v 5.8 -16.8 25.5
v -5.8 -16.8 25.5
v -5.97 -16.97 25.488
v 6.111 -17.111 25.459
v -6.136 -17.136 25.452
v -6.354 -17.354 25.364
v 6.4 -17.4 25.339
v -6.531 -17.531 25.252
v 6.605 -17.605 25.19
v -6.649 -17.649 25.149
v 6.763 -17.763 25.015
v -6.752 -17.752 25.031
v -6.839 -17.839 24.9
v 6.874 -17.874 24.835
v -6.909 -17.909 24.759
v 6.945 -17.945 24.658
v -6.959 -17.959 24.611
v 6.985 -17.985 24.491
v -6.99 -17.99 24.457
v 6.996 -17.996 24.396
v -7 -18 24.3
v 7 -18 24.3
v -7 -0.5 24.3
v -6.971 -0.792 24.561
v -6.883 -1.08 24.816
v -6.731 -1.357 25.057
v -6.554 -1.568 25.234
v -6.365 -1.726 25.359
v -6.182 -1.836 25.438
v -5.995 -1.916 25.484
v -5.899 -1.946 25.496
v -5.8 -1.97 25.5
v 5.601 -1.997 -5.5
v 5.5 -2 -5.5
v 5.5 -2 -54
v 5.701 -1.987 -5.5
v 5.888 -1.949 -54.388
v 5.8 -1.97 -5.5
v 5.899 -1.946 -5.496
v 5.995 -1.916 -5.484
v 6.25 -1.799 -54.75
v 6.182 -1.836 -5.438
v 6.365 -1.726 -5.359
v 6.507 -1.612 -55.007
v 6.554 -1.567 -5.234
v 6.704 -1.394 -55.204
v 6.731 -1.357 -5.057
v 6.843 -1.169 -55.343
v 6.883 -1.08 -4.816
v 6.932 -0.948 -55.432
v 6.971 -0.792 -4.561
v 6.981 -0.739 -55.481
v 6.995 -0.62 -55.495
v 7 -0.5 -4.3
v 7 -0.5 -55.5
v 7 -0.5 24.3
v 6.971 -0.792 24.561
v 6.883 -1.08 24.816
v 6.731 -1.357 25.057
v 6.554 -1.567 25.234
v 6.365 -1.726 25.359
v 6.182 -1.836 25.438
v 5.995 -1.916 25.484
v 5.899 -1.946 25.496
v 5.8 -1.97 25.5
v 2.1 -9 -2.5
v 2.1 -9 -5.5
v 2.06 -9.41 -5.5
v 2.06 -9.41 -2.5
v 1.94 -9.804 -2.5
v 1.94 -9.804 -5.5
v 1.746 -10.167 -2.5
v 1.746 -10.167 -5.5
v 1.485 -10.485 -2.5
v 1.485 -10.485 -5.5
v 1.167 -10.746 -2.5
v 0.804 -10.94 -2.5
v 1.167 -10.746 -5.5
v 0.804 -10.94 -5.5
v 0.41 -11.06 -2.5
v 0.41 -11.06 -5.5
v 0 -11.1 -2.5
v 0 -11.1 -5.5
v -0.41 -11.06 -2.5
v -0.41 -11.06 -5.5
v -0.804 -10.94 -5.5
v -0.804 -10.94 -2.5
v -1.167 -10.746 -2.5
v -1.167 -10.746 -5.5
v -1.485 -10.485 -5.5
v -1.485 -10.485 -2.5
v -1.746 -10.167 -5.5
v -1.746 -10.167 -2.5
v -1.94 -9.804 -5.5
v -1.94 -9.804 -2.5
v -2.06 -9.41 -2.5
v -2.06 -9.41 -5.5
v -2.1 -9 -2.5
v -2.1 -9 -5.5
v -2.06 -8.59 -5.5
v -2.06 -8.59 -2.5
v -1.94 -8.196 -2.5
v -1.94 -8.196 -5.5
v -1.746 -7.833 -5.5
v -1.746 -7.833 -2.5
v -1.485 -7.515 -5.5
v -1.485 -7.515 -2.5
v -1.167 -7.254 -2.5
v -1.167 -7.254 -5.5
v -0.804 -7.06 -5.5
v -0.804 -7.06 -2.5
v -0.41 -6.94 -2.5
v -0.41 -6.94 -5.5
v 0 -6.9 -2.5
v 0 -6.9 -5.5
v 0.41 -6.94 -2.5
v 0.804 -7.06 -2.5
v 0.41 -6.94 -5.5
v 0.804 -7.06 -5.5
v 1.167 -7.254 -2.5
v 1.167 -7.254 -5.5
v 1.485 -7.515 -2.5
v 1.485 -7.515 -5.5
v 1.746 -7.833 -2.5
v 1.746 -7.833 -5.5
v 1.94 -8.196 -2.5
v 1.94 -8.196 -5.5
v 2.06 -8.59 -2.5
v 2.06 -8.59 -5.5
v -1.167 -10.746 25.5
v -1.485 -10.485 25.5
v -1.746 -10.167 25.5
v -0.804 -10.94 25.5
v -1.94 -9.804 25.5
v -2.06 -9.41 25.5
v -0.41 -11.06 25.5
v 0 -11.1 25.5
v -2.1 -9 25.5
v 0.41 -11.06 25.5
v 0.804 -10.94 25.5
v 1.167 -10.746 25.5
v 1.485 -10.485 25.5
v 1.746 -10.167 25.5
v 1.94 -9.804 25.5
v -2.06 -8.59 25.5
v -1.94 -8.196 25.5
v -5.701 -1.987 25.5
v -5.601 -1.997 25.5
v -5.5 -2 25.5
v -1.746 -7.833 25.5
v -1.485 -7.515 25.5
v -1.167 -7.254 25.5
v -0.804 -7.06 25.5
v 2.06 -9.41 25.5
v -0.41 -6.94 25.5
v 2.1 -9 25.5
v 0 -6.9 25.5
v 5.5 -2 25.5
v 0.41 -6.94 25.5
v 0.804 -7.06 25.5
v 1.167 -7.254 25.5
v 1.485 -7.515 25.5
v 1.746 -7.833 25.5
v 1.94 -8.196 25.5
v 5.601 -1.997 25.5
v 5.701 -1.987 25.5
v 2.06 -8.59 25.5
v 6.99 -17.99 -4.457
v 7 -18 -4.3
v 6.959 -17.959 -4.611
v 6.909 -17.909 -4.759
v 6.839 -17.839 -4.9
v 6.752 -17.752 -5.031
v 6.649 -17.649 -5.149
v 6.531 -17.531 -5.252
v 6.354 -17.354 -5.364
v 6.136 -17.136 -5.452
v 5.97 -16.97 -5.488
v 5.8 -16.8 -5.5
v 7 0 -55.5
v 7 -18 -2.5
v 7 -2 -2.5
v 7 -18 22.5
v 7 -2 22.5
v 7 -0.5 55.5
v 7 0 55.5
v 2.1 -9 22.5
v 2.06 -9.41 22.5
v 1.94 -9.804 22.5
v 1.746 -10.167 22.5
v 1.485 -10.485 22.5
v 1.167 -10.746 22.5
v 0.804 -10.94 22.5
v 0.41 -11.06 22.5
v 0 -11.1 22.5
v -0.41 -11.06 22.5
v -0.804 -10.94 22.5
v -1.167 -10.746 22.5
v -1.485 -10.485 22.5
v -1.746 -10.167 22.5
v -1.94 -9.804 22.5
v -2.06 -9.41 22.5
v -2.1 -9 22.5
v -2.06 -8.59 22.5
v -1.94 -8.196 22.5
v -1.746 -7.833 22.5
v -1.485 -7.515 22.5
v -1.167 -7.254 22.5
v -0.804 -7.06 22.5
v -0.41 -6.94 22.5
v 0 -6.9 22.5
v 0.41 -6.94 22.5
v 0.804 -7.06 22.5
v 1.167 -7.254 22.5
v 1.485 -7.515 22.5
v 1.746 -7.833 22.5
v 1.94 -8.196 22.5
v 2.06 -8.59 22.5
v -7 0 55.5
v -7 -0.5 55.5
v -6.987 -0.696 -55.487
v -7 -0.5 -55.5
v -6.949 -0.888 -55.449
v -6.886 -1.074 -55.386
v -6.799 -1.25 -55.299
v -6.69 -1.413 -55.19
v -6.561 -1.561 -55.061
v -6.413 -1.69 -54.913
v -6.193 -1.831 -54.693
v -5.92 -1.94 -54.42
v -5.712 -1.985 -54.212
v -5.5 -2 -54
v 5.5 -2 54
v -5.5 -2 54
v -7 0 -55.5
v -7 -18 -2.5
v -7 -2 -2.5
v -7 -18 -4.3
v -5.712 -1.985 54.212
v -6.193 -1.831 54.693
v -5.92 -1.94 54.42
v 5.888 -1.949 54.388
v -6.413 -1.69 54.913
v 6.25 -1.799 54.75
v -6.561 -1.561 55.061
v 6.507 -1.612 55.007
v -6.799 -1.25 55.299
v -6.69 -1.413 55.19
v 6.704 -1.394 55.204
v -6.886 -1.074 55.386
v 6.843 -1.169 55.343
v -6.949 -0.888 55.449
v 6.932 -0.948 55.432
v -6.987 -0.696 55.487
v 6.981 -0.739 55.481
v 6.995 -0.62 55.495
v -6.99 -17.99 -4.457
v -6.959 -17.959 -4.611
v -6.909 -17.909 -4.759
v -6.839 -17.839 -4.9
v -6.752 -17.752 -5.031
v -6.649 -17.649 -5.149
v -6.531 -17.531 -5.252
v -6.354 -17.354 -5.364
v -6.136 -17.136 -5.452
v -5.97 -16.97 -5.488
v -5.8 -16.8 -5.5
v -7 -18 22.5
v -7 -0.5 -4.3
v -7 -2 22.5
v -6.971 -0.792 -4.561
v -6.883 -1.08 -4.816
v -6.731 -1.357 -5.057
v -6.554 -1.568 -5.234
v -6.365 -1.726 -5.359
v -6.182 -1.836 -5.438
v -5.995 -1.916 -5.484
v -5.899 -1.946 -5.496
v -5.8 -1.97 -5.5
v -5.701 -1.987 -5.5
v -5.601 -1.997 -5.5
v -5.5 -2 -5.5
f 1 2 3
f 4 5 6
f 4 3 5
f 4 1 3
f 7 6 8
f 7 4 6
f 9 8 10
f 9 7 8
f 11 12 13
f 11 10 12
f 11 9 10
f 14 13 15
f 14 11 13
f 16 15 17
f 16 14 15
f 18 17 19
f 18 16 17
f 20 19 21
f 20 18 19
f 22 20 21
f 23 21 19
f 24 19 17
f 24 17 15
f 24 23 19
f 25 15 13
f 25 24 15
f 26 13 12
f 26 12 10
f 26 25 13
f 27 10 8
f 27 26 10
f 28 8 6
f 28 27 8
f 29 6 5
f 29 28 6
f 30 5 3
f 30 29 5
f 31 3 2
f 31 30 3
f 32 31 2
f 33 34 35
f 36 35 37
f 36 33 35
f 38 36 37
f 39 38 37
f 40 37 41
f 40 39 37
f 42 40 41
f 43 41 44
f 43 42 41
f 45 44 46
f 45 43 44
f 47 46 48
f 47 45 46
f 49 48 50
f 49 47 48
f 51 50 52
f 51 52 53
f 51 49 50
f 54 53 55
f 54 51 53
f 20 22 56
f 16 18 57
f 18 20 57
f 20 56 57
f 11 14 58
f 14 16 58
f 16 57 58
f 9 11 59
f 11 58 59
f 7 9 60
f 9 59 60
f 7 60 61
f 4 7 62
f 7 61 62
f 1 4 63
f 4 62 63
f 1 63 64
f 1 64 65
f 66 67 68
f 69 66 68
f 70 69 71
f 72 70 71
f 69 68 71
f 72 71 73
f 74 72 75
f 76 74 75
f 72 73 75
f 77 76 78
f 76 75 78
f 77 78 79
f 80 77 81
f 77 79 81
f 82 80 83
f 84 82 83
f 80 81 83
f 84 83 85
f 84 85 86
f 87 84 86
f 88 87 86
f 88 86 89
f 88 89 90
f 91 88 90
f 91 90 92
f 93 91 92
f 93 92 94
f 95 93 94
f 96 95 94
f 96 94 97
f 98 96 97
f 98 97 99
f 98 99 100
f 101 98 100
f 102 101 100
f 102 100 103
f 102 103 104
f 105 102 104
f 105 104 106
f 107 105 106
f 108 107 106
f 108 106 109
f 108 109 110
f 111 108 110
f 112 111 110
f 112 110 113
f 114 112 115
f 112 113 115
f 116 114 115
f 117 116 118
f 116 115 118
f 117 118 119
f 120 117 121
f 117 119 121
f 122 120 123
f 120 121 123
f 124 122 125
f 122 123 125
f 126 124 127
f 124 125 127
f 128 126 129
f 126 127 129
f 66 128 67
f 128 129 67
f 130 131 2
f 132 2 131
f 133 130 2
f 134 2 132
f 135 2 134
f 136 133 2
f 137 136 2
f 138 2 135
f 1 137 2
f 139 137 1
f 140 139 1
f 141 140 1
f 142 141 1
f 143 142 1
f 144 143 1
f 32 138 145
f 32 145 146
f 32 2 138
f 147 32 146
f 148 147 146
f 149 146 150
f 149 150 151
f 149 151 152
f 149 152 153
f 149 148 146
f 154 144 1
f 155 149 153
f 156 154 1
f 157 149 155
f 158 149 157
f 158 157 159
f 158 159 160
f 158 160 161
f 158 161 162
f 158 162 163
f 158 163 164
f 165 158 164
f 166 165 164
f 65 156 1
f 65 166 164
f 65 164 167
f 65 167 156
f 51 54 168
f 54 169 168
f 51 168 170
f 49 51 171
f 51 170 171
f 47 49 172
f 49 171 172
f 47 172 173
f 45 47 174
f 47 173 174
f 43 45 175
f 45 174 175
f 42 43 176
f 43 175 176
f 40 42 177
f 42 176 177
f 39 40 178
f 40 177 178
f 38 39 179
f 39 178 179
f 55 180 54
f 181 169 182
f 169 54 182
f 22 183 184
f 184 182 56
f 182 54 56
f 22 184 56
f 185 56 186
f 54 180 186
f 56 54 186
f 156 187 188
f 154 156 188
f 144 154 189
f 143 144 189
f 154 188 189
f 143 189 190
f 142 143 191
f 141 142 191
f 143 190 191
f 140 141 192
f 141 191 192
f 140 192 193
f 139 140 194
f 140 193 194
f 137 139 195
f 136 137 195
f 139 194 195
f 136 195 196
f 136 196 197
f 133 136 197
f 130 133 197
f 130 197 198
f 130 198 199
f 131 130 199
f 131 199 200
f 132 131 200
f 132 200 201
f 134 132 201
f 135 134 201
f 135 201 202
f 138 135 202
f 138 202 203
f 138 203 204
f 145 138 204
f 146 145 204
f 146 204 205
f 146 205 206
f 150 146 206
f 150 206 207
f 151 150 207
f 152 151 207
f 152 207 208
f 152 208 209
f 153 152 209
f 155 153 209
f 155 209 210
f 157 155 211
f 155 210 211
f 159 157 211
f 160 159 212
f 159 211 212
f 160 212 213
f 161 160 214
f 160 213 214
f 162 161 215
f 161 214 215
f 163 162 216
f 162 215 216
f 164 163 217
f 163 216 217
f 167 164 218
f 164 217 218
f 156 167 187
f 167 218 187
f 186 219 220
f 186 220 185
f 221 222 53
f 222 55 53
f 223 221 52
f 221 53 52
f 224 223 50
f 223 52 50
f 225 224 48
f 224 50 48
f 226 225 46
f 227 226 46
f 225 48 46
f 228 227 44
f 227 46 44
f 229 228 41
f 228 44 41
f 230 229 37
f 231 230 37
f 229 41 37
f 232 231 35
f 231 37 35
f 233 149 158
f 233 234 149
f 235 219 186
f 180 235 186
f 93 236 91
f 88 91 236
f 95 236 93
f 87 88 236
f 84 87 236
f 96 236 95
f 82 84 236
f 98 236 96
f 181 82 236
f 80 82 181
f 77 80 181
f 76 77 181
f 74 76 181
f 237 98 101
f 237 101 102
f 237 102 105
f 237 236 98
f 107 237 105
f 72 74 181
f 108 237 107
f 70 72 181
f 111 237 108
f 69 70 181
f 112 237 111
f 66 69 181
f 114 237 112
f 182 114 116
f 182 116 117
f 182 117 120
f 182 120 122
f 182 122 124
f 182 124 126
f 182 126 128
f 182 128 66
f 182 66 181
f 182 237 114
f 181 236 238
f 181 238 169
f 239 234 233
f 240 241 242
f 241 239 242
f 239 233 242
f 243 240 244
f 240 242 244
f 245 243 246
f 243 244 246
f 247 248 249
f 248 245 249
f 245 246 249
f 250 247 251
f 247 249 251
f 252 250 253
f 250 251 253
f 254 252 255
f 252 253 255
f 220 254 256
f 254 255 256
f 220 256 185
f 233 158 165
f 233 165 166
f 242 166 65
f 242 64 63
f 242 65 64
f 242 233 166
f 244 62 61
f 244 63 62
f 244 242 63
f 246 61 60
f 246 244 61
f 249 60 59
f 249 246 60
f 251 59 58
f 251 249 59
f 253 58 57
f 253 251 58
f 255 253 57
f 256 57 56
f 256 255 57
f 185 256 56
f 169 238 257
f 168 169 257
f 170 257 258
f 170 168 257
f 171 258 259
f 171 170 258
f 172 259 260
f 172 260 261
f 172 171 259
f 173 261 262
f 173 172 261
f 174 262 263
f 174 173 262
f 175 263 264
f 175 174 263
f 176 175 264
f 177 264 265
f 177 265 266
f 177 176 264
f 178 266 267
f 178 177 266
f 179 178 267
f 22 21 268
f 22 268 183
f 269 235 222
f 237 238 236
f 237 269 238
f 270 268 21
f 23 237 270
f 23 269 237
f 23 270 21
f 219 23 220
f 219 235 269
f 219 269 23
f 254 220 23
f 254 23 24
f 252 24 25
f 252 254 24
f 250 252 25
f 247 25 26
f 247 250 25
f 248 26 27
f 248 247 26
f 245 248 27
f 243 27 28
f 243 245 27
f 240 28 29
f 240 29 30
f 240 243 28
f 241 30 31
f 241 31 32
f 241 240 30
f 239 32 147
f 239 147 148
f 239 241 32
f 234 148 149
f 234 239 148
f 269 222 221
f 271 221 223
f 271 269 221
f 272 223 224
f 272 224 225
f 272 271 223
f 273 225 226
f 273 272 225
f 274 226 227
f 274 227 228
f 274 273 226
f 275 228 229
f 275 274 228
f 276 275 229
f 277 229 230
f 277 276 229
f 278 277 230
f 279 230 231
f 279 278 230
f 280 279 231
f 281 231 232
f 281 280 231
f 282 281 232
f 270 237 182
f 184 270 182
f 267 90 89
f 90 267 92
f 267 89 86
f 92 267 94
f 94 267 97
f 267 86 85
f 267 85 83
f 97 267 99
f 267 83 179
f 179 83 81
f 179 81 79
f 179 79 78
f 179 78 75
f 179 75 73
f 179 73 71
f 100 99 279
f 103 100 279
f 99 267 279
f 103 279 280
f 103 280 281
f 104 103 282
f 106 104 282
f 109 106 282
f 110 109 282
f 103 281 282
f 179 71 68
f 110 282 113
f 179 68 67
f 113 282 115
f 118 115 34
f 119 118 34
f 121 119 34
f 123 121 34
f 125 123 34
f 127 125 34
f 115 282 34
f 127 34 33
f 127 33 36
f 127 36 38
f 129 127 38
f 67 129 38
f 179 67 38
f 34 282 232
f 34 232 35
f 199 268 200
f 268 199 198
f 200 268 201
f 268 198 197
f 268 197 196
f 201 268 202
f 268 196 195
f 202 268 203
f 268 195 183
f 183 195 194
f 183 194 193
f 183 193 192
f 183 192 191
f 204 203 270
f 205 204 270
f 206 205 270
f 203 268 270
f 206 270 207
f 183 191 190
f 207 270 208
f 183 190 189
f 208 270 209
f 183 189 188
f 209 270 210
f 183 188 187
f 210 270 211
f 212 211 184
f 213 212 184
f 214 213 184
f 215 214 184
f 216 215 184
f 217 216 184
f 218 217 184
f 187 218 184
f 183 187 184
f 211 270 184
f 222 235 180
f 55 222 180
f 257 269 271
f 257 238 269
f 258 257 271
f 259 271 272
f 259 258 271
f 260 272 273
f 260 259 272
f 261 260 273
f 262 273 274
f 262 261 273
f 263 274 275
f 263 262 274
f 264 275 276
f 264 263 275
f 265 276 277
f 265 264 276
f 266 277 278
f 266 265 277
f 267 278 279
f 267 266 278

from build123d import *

# Parameters (mm, degrees)
SKETCH_W     = 14
SKETCH_H     = 111
PAD_DEPTH    = 2
SKETCH001_W  = 14
SKETCH001_H  = 3
PAD001_DEPTH = 16
SKETCH002_W  = 14
SKETCH002_H  = 3
PAD002_DEPTH = 16
SKETCH003_R  = 2.1
POCKET_DEPTH = 61.001
FILLET_R     = 1.5
FILLET001_R  = 1.2


with BuildPart() as part:
    # Sketch → Pad (new body)
    with BuildSketch(Plane.XZ):
        Rectangle(SKETCH_W, SKETCH_H)
    extrude(amount=PAD_DEPTH)

    # Sketch001 (on Face6 of Pad) → Pad001 (join)
    with BuildSketch(Plane.XZ.offset(2)):
        with Locations((0, 24)):
            Rectangle(SKETCH001_W, SKETCH001_H)
    extrude(amount=PAD001_DEPTH)

    # Sketch002 (on Face7 of Pad001) → Pad002 (join)
    with BuildSketch(Plane.XZ.offset(2)):
        with Locations((0, -4)):
            Rectangle(SKETCH002_W, SKETCH002_H)
    extrude(amount=PAD002_DEPTH)

    # Sketch003 (on Face14 of Pad002) → Pocket (cut, through all)
    with BuildSketch(Plane(origin=(0, 0, -5.5), x_dir=(1, 0, 0), z_dir=(0, 0, -1))):
        with Locations((0, 9)):
            Circle(SKETCH003_R)
    extrude(amount=-POCKET_DEPTH, mode=Mode.SUBTRACT)

    # Fillet
    fillet_edges = [part.edges().sort_by_distance(p)[0] for p in [
        (7, -2, 40.5),
        (-7, -2, 40.5),
        (0, -2, 55.5),
        (-7, -2, -30.5),
        (7, -2, -30.5),
        (0, -2, -55.5),
    ]]
    fillet(fillet_edges, radius=FILLET_R)

    # Fillet001
    fillet001_edges = [part.edges().sort_by_distance(p)[0] for p in [
        (-7, -10, 25.5),
        (0, -18, 25.5),
        (7, -10, 25.5),
        (0, -18, -5.5),
        (7, -10, -5.5),
        (-7, -10, -5.5),
    ]]
    fillet(fillet001_edges, radius=FILLET001_R)


solid = part.part
